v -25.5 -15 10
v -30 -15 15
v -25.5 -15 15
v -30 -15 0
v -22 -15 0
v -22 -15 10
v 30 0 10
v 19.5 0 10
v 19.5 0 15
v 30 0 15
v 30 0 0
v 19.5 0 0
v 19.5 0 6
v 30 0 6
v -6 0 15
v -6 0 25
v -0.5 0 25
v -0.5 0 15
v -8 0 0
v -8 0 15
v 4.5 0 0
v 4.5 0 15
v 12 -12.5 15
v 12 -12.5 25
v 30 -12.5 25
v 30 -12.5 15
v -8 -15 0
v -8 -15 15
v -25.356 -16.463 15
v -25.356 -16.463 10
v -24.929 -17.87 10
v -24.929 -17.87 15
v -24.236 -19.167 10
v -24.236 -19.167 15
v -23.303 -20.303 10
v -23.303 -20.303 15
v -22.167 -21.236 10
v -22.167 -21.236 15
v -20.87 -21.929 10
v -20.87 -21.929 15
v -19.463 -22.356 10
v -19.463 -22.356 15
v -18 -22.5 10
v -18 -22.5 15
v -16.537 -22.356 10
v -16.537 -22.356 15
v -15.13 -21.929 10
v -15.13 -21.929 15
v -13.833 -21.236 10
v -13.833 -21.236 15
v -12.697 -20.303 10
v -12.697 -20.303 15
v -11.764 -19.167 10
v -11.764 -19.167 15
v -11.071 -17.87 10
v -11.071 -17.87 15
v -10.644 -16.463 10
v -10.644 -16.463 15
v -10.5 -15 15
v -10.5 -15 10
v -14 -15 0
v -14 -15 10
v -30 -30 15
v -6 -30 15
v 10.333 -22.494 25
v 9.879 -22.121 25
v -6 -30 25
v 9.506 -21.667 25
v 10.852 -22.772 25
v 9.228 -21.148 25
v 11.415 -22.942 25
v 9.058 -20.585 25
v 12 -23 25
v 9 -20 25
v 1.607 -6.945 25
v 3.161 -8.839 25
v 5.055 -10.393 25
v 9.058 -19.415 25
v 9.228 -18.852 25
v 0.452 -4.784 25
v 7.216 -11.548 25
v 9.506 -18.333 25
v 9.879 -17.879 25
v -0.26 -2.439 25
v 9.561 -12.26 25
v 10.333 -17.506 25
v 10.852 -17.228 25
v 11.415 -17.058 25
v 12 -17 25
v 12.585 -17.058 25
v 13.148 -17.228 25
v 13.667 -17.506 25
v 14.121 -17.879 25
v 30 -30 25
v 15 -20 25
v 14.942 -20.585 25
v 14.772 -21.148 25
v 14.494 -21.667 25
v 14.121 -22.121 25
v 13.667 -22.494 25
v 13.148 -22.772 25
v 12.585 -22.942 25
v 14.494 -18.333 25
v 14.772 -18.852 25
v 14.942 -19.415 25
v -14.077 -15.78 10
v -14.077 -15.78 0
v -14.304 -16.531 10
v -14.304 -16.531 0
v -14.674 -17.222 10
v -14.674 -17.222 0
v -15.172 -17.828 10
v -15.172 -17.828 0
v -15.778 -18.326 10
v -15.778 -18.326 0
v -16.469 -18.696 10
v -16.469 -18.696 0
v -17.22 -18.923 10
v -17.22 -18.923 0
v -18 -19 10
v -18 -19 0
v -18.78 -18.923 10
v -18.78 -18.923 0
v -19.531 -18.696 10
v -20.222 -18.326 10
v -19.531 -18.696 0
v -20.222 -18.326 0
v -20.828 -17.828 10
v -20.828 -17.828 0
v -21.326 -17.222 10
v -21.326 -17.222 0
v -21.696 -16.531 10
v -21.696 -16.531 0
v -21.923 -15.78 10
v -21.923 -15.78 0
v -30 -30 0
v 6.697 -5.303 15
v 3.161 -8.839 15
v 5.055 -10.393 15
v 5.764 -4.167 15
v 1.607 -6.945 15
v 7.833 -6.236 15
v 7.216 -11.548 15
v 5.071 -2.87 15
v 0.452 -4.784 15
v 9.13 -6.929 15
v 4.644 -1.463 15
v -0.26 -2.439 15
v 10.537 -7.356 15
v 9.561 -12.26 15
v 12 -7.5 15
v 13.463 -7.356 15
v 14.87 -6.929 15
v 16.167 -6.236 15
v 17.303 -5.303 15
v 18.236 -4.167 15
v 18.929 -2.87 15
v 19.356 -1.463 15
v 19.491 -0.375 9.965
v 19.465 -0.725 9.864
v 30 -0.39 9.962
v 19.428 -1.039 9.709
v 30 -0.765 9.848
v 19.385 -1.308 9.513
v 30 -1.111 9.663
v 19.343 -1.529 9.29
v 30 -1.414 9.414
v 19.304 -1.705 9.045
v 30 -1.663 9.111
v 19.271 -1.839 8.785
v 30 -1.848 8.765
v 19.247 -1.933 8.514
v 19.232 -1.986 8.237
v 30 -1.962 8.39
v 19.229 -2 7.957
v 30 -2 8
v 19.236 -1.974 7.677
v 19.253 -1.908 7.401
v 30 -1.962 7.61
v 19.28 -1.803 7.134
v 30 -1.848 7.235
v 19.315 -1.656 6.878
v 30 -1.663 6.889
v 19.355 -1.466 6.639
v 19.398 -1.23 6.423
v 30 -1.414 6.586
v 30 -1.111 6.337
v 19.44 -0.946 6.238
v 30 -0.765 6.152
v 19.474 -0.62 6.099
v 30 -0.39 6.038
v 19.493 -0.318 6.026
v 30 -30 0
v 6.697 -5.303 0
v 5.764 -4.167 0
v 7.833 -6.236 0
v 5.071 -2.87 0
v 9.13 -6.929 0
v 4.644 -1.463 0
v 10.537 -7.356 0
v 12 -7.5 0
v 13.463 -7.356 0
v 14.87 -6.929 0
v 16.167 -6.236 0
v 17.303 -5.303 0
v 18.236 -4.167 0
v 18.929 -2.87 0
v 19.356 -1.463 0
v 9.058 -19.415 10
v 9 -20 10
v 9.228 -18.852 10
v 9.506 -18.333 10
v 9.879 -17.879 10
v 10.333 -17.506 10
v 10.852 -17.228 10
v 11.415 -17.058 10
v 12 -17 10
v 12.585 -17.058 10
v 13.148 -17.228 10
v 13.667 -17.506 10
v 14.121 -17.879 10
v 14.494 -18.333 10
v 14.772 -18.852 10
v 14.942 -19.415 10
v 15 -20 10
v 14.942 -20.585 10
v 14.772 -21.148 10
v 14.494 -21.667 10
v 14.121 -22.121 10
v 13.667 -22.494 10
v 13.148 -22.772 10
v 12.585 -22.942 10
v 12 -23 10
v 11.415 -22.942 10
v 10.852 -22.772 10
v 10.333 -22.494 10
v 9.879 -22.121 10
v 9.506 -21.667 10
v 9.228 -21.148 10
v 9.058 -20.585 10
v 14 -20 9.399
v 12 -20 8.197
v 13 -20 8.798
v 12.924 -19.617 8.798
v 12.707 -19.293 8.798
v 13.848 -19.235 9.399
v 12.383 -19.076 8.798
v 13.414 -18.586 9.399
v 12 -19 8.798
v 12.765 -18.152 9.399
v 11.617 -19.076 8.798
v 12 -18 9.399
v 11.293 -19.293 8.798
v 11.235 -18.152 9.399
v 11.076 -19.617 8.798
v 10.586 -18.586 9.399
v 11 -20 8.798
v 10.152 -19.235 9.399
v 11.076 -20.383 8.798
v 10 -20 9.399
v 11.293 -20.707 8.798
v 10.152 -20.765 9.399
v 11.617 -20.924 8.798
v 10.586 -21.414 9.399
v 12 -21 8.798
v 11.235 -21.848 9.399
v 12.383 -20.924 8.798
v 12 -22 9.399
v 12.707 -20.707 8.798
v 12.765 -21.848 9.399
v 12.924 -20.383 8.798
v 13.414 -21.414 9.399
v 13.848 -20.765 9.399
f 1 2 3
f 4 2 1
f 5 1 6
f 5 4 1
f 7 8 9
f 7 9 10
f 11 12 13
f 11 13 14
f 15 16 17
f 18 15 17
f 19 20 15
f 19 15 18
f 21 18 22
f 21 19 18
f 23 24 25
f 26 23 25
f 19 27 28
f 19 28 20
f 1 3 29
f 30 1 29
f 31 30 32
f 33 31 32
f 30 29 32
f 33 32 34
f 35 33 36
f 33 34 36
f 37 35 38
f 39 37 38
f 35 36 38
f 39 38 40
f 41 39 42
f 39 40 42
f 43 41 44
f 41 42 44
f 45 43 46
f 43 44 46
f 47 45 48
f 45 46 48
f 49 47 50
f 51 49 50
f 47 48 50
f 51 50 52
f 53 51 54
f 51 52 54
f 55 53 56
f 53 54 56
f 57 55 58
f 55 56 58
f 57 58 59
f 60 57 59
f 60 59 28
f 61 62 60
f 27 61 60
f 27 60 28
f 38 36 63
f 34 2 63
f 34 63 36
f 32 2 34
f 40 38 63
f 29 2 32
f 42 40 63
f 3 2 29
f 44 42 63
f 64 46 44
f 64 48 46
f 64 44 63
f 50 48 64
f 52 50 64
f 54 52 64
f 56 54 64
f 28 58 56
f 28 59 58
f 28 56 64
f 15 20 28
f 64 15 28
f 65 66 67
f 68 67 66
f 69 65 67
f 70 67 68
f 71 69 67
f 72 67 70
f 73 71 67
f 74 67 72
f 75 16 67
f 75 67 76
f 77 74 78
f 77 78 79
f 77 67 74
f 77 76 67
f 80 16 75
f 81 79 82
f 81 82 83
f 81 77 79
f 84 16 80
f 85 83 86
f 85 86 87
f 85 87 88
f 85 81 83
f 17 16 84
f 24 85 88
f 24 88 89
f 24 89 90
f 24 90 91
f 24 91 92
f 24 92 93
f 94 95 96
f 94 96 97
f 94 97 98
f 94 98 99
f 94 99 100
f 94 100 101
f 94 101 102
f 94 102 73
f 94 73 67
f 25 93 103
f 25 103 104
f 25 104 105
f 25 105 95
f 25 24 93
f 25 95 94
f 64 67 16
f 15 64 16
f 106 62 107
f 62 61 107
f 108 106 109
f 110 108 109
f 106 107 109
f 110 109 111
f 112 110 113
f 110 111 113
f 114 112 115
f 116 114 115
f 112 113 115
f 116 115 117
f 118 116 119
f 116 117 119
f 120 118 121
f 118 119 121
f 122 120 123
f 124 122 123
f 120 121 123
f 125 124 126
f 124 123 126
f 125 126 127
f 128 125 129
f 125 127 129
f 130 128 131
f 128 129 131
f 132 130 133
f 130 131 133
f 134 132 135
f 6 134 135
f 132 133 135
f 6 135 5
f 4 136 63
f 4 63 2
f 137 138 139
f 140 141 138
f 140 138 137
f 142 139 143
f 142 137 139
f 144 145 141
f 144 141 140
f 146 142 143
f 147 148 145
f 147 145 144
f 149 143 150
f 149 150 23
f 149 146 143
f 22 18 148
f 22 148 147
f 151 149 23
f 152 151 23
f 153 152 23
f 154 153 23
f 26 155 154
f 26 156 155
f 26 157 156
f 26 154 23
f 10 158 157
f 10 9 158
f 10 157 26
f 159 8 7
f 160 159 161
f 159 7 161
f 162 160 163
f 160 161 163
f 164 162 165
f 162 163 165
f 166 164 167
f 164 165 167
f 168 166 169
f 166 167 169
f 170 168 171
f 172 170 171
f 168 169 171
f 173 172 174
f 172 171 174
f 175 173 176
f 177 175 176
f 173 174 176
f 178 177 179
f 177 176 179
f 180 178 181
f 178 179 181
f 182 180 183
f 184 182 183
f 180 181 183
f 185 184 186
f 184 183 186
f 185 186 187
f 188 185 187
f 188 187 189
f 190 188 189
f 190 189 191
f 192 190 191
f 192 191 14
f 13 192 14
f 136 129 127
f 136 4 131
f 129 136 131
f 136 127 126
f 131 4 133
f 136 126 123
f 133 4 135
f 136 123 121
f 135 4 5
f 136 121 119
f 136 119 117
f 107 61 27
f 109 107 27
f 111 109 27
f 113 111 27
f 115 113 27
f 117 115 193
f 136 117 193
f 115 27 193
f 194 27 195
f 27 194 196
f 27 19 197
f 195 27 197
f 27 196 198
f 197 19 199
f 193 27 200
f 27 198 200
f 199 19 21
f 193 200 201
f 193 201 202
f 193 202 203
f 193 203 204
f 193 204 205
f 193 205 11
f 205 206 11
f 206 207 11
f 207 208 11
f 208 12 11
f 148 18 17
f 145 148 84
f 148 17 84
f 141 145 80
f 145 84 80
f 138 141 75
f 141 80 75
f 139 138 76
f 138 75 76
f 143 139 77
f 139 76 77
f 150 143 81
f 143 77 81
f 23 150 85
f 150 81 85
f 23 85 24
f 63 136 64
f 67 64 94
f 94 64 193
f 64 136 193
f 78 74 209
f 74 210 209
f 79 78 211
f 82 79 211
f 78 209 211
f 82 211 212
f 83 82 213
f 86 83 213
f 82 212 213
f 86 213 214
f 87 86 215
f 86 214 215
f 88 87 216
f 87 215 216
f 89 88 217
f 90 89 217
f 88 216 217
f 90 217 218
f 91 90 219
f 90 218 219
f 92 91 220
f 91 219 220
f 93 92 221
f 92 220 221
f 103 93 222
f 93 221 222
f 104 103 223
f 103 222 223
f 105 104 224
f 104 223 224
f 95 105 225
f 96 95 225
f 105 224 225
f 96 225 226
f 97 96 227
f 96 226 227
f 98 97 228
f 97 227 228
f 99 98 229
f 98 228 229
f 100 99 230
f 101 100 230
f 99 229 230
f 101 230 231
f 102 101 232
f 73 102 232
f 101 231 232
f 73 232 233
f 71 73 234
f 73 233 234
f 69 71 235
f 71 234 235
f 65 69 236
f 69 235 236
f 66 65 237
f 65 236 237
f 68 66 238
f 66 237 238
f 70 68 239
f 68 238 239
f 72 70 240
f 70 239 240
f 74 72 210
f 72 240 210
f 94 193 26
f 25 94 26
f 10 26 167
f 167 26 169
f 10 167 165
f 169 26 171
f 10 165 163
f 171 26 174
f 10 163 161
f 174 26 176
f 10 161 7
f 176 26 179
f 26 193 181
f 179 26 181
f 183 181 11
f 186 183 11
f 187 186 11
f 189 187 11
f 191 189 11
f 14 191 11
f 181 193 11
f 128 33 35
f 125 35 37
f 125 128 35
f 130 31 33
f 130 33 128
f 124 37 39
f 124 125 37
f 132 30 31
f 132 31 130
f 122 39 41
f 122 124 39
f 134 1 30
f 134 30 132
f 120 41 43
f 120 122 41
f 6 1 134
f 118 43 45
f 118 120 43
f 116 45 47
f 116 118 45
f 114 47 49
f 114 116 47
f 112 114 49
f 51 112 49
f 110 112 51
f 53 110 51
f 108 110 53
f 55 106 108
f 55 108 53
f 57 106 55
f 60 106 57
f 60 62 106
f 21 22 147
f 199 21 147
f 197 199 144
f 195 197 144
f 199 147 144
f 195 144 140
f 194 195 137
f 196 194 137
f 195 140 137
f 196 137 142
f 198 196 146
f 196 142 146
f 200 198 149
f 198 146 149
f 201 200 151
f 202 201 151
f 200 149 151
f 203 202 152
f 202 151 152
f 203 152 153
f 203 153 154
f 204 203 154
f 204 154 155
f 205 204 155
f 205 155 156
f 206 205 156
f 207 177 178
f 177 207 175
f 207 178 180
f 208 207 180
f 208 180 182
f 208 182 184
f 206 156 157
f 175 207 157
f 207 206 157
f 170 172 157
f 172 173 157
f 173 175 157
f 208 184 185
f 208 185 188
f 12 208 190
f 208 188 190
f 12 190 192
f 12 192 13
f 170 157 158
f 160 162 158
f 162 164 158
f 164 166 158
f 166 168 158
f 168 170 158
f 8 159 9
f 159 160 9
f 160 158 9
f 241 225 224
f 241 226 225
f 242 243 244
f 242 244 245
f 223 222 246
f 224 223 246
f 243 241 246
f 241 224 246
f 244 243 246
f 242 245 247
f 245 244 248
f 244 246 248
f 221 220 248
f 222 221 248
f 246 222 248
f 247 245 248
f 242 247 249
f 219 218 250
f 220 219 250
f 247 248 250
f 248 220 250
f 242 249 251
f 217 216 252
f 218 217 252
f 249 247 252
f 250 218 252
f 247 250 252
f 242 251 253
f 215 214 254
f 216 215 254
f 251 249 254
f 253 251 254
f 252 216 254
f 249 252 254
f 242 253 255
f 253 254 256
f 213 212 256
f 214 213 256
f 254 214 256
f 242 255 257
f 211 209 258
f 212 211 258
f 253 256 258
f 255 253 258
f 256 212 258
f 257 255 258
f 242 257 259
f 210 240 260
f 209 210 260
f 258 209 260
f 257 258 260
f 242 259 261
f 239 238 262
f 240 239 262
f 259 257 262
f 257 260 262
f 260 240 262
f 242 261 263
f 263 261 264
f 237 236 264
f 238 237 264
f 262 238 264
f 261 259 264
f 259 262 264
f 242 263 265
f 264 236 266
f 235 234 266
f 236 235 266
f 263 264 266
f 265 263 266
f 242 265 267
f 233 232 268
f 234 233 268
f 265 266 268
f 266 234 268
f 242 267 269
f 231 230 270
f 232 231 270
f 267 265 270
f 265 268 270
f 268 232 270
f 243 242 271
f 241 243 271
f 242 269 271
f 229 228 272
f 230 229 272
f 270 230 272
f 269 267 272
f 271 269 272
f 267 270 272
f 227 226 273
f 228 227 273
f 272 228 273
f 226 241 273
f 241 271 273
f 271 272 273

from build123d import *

# Parameters (mm, degrees)
F0_W           = 60
F0_H           = 60
F1_DEPTH       = 25
F2_W           = 24
F2_H           = 60
F3_DEPTH       = 10
F5_D           = 8
F5_CBORE_D     = 15
F5_CBORE_DEPTH = 5
F6_R           = 7.5
F7_DEPTH       = 15
F9_D           = 6
F9_DEPTH       = 15
F9_TIP         = 1.8025818571
F10_R          = 2
F11_DEPTH      = 10.7725839526
F14_DEPTH      = 25


with BuildPart() as f1:
    # F0 (on Top) → F1 (new body)
    with BuildSketch(Plane.XY):
        Rectangle(F0_W, F0_H)
    extrude(amount=F1_DEPTH)

    # F2 (on face) → F3 (cut)
    with BuildSketch(Plane.XY.offset(25)):
        with Locations((-18, 0)):
            Rectangle(F2_W, F2_H)
        with BuildLine():
            Line((30, -12.5), (30, 12.5))
            Line((30, 12.5), (12, 12.5))
            ThreePointArc((12, 12.5), (-0.5, 0), (12, -12.5))
            Line((12, -12.5), (30, -12.5))
        make_face()
    extrude(amount=-F3_DEPTH, mode=Mode.SUBTRACT)

    # F5 (through all)
    with Locations(Plane.XY.offset(15)):
        with Locations((-18, 15), (-18, -15)):
            CounterBoreHole(F5_D / 2, F5_CBORE_D / 2, F5_CBORE_DEPTH)

    # F6 (on face) → F7 (cut, through all)
    with BuildSketch(Plane.XY.offset(15)):
        with Locations((12, 0)):
            Circle(F6_R)
    extrude(amount=-F7_DEPTH, mode=Mode.SUBTRACT)

    # F9
    with Locations(Plane.XY.offset(25)):
        with Locations((12, 20), (12, -20)):
            Hole(F9_D / 2, depth=F9_DEPTH)
            with Locations((0, 0, -(F9_DEPTH + F9_TIP / 2))):  # 118° drill point
                Cone(0, F9_D / 2, F9_TIP, mode=Mode.SUBTRACT)

    # F10 (on face) → F11 (cut, through all)
    with BuildSketch(Plane.YZ.offset(30)):
        with Locations((0, 8)):
            Circle(F10_R)
    extrude(amount=-F11_DEPTH, mode=Mode.SUBTRACT)

    # F13 (on Top) → F14 (cut, through all)
    with BuildSketch(Plane.XY):
        Polygon((-8, 0), (30, 0), (30, 30), (-30, 30), (-30, -15), (-8, -15), align=None)
    extrude(amount=F14_DEPTH, mode=Mode.SUBTRACT)


solid = f1.part
